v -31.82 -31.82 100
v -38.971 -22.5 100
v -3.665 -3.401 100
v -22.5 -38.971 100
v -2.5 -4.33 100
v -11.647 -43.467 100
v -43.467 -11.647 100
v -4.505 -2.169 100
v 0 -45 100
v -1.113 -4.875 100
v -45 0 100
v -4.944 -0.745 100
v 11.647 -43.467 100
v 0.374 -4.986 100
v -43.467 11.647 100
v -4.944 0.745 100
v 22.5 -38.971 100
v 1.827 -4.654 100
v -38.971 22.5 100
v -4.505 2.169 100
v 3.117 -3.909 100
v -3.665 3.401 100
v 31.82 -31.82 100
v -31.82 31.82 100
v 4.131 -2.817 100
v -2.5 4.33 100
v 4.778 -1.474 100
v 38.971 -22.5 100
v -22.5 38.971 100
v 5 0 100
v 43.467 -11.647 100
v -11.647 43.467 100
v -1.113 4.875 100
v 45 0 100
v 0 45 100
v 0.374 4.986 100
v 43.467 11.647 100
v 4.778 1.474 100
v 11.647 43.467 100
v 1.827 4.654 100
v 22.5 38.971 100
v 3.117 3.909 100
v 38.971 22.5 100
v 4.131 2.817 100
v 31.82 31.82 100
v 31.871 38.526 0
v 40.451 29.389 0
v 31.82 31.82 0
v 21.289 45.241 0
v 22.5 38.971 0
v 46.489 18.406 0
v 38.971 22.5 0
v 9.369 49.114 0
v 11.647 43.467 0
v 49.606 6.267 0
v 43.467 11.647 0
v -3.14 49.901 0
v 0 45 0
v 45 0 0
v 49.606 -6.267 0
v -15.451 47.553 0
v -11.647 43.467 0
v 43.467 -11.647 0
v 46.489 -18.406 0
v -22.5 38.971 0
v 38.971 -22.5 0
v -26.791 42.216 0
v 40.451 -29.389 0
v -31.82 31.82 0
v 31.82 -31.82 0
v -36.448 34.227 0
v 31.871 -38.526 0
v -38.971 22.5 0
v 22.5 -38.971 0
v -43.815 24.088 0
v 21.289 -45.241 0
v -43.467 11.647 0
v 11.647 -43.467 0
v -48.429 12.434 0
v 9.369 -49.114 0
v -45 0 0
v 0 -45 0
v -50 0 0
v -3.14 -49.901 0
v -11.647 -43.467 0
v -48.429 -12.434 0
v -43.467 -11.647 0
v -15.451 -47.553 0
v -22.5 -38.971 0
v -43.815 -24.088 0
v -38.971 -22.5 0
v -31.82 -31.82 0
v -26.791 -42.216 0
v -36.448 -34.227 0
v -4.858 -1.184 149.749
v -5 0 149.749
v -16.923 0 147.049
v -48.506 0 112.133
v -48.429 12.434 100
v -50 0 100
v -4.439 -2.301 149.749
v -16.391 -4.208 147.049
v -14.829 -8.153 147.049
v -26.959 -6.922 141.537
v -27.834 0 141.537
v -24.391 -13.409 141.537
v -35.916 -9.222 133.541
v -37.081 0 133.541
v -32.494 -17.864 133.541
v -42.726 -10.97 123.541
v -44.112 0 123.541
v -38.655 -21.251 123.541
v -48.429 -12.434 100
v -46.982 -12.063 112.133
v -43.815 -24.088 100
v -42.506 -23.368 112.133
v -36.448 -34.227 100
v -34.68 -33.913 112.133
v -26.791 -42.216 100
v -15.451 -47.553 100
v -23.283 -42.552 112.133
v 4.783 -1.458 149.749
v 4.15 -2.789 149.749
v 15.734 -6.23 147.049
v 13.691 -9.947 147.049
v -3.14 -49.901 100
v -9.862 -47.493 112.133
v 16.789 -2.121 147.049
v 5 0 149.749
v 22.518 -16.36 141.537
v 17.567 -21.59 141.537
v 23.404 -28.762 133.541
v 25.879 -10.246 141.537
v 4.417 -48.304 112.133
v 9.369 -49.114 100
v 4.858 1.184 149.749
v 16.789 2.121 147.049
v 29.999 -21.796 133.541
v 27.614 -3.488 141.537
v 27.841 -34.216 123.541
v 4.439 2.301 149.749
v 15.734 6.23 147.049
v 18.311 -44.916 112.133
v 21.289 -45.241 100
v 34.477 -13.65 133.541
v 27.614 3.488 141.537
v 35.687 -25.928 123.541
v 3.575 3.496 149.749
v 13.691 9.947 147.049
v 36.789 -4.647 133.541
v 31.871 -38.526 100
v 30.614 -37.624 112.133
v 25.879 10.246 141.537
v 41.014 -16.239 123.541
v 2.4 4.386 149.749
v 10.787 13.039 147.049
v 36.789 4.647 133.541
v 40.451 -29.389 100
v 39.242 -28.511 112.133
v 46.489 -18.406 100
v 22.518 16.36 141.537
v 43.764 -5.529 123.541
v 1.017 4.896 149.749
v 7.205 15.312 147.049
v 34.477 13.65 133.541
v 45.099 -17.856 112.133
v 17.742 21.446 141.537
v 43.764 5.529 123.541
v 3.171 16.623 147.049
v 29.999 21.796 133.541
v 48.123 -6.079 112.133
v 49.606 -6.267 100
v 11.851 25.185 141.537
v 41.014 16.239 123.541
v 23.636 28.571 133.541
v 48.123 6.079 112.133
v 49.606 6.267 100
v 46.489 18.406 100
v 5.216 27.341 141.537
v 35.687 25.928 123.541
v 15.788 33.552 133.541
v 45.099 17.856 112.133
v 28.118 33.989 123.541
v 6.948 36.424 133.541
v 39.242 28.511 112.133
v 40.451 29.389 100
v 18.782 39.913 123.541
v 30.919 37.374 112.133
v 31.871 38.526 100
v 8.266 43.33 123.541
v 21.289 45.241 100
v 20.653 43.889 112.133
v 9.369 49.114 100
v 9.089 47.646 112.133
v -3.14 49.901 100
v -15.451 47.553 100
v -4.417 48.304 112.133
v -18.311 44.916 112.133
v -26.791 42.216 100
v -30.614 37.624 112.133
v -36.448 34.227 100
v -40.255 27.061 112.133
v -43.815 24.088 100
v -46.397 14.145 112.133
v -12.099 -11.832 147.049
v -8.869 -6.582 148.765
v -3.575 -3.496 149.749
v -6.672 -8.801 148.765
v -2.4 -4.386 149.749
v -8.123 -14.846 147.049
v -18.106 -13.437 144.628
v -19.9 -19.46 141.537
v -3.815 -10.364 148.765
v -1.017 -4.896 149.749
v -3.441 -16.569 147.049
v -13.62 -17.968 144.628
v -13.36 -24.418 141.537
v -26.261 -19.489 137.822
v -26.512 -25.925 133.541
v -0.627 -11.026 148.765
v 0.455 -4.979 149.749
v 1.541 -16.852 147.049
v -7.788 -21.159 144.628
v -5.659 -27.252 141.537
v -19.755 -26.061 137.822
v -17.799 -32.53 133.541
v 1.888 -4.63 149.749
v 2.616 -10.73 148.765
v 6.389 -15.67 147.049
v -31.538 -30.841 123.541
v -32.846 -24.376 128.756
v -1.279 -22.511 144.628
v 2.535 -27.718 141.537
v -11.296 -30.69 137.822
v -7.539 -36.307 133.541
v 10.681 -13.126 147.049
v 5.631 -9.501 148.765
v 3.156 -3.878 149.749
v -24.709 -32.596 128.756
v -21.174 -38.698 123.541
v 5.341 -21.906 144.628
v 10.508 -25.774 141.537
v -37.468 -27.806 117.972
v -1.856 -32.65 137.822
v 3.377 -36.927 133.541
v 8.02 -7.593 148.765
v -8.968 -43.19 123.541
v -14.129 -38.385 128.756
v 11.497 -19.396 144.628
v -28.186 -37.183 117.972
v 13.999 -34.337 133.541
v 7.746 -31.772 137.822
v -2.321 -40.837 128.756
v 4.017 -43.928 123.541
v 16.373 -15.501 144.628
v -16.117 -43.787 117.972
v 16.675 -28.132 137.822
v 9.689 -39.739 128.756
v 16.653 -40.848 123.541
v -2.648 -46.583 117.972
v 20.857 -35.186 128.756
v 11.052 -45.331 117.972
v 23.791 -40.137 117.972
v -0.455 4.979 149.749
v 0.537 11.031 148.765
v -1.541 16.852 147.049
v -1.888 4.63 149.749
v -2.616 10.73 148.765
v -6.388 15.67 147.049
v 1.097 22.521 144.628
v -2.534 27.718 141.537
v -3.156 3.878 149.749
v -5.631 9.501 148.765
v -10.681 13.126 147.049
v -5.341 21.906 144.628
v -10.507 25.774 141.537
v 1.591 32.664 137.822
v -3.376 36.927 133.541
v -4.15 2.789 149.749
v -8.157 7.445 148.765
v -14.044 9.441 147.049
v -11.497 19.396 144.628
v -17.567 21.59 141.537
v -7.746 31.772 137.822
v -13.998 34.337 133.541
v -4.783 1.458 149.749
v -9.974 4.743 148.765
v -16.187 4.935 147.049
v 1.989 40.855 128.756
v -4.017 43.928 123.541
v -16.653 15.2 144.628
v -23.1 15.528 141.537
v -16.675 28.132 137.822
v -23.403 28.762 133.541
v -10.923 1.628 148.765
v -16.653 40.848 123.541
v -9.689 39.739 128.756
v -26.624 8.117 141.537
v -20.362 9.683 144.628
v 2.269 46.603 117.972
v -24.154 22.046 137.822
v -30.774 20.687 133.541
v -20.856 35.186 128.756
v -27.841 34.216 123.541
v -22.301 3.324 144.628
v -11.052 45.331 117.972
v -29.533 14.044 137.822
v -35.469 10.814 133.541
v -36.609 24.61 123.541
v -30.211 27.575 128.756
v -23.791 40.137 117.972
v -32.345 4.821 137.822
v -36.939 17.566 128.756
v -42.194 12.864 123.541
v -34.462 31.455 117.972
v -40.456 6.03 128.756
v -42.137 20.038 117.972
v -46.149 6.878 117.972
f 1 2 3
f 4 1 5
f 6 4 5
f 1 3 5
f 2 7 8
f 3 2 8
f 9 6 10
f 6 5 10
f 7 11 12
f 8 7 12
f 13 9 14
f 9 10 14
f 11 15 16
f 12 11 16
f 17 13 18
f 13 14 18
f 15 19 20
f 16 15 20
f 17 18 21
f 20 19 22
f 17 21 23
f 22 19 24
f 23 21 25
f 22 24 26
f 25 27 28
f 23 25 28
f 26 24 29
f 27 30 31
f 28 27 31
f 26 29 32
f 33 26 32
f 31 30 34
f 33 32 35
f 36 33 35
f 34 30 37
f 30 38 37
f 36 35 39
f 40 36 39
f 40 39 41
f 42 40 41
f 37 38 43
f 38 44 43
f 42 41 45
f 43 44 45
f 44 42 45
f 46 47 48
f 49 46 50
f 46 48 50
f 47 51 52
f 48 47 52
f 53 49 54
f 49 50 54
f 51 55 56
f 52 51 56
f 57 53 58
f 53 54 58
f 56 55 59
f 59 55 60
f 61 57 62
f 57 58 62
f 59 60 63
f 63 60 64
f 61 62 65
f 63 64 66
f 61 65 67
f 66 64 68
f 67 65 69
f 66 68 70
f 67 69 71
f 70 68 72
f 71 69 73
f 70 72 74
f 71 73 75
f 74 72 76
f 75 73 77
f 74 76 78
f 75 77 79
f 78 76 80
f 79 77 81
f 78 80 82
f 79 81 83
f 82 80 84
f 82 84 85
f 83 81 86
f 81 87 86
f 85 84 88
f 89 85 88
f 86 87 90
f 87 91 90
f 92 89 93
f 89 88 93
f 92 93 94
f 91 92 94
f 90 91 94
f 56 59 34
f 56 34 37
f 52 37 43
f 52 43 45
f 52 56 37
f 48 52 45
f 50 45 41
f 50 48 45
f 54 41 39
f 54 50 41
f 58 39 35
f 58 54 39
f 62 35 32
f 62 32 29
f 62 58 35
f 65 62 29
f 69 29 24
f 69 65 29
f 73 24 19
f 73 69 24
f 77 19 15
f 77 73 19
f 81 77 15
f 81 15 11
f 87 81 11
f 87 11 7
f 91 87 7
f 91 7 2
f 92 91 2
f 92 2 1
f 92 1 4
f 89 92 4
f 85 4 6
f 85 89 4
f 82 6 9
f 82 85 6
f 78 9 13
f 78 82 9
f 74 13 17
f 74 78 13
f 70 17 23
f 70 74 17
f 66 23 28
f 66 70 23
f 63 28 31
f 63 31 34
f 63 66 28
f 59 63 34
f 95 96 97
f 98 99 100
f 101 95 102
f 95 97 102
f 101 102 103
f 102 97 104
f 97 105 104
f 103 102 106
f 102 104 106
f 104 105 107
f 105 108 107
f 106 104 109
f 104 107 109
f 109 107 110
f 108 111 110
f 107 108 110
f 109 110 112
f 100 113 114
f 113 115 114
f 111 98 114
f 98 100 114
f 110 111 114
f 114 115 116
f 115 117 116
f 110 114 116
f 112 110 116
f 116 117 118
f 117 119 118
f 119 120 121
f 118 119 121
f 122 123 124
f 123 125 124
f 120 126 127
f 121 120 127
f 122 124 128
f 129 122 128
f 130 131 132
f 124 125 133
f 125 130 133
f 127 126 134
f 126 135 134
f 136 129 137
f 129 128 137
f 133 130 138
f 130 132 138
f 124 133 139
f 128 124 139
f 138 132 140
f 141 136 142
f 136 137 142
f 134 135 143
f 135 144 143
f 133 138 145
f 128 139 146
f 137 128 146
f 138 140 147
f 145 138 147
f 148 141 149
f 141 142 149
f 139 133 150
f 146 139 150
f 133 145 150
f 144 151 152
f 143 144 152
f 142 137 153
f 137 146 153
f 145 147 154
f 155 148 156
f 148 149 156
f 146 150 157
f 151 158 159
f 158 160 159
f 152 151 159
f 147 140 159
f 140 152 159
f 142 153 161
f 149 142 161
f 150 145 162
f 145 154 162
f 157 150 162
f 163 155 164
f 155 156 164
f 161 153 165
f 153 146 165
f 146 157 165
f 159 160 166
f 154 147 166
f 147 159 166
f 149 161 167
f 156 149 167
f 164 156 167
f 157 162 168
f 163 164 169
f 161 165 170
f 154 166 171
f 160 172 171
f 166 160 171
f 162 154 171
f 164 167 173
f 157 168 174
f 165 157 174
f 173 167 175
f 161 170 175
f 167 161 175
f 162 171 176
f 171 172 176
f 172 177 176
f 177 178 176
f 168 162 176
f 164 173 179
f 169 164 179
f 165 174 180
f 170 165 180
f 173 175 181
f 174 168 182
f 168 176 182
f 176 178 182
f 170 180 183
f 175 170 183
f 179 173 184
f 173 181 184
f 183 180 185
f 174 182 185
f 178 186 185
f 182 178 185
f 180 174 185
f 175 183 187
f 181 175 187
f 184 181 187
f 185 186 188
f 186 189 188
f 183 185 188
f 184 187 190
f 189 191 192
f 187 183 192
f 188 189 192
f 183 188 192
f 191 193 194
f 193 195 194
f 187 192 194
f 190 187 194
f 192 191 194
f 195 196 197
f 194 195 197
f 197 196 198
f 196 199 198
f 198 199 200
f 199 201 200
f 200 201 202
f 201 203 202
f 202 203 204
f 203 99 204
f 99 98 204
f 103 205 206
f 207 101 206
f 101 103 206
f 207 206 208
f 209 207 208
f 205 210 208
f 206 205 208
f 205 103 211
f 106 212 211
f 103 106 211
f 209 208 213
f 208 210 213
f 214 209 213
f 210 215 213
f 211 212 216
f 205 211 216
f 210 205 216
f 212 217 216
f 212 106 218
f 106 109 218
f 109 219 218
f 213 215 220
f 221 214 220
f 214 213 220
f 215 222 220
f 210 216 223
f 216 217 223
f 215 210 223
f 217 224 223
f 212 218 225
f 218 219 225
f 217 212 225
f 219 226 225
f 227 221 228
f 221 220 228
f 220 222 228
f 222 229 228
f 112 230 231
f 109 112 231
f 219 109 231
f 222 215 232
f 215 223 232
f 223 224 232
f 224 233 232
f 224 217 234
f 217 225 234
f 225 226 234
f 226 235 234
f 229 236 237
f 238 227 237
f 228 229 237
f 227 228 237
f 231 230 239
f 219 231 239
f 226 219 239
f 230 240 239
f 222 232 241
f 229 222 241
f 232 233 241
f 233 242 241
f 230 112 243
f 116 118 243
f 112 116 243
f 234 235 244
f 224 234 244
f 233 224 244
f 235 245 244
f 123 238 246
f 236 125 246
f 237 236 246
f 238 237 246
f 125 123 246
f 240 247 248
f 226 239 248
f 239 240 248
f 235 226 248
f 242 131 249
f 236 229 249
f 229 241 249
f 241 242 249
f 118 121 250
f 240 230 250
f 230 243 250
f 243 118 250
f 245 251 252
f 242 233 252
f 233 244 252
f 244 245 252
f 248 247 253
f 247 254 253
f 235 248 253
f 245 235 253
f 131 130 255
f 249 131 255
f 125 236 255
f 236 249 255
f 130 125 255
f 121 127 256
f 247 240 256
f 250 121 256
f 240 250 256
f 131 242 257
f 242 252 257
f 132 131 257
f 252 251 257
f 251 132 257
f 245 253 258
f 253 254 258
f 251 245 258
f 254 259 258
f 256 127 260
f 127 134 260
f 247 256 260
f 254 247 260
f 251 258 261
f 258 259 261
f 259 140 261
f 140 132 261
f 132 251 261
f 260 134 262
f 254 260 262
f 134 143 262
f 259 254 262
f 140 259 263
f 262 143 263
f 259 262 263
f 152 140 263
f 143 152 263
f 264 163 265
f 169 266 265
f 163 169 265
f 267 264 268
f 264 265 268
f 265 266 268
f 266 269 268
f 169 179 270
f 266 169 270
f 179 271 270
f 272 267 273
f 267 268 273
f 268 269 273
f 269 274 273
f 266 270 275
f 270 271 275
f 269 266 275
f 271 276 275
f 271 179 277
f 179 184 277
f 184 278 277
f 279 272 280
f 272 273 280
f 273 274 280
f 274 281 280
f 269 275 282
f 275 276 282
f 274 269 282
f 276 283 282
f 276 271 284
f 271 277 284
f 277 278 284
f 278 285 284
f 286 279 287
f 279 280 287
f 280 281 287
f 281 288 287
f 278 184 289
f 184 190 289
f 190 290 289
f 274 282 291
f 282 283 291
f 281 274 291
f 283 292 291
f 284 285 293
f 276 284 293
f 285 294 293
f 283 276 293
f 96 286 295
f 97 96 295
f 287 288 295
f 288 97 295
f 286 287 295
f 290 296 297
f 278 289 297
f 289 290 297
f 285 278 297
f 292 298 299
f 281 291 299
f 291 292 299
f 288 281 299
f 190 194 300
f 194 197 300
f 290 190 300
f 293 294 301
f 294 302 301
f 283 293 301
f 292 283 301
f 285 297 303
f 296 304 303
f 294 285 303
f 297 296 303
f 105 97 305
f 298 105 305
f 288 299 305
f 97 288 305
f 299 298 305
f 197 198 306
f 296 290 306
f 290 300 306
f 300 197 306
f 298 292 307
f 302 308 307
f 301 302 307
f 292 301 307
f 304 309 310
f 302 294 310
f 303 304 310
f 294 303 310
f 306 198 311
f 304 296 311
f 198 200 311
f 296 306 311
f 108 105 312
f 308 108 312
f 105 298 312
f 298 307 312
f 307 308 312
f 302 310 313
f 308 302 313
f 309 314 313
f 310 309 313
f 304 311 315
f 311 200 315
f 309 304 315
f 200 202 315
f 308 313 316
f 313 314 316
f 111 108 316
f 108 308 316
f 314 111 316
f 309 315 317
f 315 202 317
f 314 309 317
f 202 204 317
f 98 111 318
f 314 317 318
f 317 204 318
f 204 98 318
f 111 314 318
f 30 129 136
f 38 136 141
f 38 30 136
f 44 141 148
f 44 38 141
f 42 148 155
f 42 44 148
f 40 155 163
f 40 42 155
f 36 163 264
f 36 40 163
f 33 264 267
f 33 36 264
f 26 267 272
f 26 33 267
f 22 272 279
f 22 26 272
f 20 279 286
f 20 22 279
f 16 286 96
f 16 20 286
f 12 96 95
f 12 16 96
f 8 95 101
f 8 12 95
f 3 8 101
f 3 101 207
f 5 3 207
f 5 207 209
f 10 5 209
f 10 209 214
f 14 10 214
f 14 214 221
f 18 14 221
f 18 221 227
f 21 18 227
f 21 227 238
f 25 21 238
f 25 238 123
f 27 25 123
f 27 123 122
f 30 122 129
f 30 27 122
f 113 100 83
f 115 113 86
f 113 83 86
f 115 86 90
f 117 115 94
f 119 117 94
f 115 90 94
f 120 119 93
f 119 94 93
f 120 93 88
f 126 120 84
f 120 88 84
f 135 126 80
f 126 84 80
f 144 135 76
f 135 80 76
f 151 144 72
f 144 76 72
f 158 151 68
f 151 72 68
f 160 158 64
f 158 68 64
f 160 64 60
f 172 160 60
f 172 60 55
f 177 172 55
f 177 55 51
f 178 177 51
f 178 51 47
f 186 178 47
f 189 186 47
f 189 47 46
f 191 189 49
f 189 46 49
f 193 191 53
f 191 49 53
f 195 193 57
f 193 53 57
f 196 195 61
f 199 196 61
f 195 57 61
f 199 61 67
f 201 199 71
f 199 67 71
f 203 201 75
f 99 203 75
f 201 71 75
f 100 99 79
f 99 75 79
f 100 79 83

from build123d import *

# Parameters (mm, degrees)
F2_R     = 45
F3_DEPTH = 100
F4_R     = 5
F5_DEPTH = 150.001


with BuildPart() as f1:
    # F0 (on Front) → F1 (revolve)
    with BuildSketch(Plane.XZ):
        with BuildLine():
            Line((-50, 0), (0, 0))
            Line((0, 0), (0, 150))
            ThreePointArc((0, 150), (-35.355339, 135.355339), (-50, 100))
            Line((-50, 100), (-50, 0))
        make_face()
    revolve(axis=Axis((0, 0, 75), (0, 0, 1)))

    # F2 (on Top) → F3 (cut)
    with BuildSketch(Plane.XY):
        Circle(F2_R)
    extrude(amount=F3_DEPTH, mode=Mode.SUBTRACT)

    # F4 (on Top) → F5 (cut, through all)
    with BuildSketch(Plane.XY):
        Circle(F4_R)
    extrude(amount=F5_DEPTH, mode=Mode.SUBTRACT)


solid = f1.part
